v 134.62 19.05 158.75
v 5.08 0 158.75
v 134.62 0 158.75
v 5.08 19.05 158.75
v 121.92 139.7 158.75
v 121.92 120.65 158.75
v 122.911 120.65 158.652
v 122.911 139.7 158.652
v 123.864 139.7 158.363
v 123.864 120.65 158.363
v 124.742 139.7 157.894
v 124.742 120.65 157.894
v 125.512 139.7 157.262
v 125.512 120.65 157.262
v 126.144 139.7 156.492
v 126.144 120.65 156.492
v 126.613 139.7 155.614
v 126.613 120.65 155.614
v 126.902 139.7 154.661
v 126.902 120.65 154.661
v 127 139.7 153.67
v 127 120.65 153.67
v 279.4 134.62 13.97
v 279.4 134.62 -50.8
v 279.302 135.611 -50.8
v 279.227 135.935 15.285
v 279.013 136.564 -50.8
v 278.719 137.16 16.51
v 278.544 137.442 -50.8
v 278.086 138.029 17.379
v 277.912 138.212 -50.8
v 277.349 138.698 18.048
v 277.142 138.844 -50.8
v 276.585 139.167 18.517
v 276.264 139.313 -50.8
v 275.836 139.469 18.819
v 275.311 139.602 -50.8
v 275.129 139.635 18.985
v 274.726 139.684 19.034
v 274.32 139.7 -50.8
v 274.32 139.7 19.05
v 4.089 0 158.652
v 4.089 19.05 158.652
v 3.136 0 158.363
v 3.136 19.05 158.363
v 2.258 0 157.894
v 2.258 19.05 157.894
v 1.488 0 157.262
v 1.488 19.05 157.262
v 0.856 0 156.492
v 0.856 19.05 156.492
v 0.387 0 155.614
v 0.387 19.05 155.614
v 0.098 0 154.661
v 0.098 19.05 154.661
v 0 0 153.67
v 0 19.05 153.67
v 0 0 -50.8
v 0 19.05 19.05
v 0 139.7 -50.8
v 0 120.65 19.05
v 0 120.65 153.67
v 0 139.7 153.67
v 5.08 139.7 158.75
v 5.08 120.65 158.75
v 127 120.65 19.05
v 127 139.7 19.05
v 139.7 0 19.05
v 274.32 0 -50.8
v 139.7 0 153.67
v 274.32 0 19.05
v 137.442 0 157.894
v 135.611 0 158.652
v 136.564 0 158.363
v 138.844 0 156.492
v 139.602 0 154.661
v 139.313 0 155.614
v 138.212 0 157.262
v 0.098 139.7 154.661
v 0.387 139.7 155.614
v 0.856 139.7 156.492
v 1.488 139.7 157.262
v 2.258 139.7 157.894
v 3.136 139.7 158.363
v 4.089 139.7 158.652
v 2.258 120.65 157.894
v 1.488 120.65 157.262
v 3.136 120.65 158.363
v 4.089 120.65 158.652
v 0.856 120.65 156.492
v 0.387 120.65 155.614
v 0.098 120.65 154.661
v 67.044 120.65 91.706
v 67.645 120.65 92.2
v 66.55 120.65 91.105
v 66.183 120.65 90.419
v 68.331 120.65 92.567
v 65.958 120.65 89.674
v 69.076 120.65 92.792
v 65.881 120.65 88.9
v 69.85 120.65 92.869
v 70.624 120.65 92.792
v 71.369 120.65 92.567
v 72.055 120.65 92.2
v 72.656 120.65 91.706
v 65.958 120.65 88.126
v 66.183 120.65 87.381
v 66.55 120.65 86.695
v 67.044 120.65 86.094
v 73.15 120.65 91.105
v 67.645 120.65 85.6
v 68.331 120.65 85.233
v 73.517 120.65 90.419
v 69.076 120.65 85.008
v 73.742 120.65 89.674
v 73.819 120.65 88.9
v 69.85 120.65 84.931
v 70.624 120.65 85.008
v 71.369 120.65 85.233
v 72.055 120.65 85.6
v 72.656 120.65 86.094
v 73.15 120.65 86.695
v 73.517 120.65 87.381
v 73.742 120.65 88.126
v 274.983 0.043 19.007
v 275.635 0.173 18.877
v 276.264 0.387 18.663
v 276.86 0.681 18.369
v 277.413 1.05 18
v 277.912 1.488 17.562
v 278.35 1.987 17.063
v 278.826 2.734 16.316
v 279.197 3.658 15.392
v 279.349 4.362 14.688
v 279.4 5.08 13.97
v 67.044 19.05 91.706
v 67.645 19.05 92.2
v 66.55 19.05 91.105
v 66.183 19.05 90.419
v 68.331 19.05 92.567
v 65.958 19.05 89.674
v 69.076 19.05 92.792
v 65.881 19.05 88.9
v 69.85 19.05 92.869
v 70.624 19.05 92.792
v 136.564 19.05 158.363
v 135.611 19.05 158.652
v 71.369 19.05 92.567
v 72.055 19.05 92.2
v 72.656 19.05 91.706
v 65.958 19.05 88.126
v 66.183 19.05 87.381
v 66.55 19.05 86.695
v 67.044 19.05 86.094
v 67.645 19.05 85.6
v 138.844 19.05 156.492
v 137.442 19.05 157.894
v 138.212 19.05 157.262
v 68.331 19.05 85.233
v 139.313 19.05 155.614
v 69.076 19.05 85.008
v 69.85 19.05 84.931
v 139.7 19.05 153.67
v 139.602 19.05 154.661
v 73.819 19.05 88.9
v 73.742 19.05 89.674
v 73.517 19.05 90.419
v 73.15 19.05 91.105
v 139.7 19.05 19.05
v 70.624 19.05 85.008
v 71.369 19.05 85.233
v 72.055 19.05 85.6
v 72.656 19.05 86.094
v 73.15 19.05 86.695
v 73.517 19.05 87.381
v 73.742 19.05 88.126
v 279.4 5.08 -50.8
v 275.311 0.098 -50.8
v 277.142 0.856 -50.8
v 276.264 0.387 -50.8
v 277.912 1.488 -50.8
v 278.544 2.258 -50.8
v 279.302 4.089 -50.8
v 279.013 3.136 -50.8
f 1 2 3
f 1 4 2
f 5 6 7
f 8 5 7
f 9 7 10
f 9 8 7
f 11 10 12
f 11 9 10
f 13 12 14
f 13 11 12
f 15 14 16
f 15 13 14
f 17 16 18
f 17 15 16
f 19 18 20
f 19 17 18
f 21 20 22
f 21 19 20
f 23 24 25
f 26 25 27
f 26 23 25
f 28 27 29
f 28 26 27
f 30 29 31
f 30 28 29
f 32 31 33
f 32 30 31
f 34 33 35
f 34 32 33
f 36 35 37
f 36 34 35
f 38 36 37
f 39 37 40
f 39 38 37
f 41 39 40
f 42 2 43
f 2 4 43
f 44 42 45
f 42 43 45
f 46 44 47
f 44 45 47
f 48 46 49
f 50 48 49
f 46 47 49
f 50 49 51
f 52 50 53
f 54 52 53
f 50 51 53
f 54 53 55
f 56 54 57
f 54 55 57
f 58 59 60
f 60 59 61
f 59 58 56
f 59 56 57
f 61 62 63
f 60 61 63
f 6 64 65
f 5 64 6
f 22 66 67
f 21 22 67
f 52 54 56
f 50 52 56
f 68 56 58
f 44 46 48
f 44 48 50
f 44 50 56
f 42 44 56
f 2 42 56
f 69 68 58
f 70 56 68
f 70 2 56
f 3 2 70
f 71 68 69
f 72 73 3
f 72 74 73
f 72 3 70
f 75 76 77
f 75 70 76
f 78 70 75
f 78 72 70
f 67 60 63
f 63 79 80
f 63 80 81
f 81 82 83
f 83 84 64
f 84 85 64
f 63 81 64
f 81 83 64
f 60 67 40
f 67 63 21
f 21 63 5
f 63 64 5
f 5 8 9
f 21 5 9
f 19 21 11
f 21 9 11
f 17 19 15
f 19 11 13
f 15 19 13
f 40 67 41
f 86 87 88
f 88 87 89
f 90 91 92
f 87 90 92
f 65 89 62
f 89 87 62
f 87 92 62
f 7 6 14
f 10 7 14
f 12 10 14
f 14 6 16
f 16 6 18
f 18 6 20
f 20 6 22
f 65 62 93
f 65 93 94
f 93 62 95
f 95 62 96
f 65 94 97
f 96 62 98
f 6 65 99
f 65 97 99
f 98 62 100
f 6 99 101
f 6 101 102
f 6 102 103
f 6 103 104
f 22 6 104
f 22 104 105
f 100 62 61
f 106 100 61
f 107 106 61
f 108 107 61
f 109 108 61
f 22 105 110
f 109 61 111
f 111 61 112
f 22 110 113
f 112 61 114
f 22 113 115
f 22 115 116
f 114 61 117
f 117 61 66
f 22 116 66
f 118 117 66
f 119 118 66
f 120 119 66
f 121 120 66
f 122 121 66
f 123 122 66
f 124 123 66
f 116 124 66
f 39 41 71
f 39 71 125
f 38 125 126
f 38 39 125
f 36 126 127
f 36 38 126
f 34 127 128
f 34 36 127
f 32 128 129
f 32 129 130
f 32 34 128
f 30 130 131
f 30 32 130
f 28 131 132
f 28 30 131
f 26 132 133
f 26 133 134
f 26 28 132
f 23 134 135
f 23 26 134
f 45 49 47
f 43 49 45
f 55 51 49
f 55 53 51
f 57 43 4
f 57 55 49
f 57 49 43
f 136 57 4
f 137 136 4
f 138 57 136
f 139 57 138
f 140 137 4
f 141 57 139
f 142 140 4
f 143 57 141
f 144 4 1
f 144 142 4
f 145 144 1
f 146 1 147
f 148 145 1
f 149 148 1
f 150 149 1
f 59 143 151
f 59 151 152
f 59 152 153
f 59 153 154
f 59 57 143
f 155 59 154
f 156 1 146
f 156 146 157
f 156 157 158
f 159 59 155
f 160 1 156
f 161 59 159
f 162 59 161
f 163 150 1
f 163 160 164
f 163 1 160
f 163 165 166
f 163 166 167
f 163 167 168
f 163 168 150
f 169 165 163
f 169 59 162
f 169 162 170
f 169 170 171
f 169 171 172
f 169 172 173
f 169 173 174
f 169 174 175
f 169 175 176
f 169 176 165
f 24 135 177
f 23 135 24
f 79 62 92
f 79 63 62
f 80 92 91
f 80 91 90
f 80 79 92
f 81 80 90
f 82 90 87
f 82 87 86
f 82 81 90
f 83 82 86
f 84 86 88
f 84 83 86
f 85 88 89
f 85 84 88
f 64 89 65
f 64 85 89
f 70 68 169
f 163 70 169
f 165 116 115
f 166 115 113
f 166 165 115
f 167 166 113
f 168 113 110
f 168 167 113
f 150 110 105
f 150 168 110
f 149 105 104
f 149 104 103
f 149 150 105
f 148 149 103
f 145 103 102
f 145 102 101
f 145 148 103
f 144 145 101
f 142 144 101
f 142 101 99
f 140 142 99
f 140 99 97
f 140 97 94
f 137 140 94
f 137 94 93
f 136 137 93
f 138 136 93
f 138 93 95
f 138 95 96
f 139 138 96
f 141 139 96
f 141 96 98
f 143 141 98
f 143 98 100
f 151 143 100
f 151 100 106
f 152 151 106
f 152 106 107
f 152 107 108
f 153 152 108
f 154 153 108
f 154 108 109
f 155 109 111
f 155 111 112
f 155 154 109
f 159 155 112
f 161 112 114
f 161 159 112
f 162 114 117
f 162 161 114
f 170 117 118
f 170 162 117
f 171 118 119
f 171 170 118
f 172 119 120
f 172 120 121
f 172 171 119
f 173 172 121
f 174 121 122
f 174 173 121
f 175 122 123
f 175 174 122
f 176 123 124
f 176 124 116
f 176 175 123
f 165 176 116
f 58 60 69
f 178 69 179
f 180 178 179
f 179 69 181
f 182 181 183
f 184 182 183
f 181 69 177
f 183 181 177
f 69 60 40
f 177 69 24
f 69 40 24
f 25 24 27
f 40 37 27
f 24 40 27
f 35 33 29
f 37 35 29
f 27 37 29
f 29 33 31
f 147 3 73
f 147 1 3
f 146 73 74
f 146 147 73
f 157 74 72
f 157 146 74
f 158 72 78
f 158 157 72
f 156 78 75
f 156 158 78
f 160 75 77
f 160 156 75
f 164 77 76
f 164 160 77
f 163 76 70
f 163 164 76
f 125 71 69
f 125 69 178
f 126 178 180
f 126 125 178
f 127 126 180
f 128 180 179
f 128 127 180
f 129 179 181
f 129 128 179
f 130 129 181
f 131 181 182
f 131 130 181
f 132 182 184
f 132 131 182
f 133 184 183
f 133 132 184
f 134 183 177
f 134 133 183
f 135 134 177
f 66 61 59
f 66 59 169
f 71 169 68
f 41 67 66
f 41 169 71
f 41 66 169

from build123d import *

# Parameters (mm, degrees)
F0_W     = 279.4
F0_H     = 139.7
F1_DEPTH = 19.05
F2_W     = 127
F2_H     = 19.05
F3_DEPTH = 139.7
F4_W     = 139.7
F4_H     = 19.05
F5_DEPTH = 139.7
F6_R     = 3.96875
F7_DEPTH = 139.7
F8_R     = 5.08
F9_DEPTH = 50.8


with BuildPart() as f1:
    # F0 (on Top) → F1 (new body)
    with BuildSketch(Plane.XY):
        with Locations((139.7, 69.85)):
            Rectangle(F0_W, F0_H)
    extrude(amount=F1_DEPTH)

    # F2 (on face) → F3 (join)
    with BuildSketch(Plane.XY.offset(19.05)):
        with Locations((63.5, 130.175)):
            Rectangle(F2_W, F2_H)
    extrude(amount=F3_DEPTH)

    # F4 (on face) → F5 (join)
    with BuildSketch(Plane.XY.offset(19.05)):
        with Locations((69.85, 9.525)):
            Rectangle(F4_W, F4_H)
    extrude(amount=F5_DEPTH)

    # F6 (on face) → F7 (join, through all)
    with BuildSketch(Plane.XZ):
        with Locations((69.85, 88.9)):
            Circle(F6_R)
    extrude(amount=-F7_DEPTH)

    # F8
    f8_edges = [f1.edges().sort_by_distance(p)[0] for p in [
        (139.7, 9.525, 158.75),
        (0, 9.525, 158.75),
        (0, 130.175, 158.75),
        (127, 130.175, 158.75),
        (279.4, 0, 9.525),
        (279.4, 139.7, 9.525),
        (279.4, 69.85, 19.05),
    ]]
    fillet(f8_edges, radius=F8_R)

    # F9 (add): a face of the model
    f9_faces = [f1.faces().sort_by_distance(p)[0] for p in [
        (139.6606680243, 69.85, 0),
    ]]
    extrude(f9_faces, amount=F9_DEPTH)


solid = f1.part
